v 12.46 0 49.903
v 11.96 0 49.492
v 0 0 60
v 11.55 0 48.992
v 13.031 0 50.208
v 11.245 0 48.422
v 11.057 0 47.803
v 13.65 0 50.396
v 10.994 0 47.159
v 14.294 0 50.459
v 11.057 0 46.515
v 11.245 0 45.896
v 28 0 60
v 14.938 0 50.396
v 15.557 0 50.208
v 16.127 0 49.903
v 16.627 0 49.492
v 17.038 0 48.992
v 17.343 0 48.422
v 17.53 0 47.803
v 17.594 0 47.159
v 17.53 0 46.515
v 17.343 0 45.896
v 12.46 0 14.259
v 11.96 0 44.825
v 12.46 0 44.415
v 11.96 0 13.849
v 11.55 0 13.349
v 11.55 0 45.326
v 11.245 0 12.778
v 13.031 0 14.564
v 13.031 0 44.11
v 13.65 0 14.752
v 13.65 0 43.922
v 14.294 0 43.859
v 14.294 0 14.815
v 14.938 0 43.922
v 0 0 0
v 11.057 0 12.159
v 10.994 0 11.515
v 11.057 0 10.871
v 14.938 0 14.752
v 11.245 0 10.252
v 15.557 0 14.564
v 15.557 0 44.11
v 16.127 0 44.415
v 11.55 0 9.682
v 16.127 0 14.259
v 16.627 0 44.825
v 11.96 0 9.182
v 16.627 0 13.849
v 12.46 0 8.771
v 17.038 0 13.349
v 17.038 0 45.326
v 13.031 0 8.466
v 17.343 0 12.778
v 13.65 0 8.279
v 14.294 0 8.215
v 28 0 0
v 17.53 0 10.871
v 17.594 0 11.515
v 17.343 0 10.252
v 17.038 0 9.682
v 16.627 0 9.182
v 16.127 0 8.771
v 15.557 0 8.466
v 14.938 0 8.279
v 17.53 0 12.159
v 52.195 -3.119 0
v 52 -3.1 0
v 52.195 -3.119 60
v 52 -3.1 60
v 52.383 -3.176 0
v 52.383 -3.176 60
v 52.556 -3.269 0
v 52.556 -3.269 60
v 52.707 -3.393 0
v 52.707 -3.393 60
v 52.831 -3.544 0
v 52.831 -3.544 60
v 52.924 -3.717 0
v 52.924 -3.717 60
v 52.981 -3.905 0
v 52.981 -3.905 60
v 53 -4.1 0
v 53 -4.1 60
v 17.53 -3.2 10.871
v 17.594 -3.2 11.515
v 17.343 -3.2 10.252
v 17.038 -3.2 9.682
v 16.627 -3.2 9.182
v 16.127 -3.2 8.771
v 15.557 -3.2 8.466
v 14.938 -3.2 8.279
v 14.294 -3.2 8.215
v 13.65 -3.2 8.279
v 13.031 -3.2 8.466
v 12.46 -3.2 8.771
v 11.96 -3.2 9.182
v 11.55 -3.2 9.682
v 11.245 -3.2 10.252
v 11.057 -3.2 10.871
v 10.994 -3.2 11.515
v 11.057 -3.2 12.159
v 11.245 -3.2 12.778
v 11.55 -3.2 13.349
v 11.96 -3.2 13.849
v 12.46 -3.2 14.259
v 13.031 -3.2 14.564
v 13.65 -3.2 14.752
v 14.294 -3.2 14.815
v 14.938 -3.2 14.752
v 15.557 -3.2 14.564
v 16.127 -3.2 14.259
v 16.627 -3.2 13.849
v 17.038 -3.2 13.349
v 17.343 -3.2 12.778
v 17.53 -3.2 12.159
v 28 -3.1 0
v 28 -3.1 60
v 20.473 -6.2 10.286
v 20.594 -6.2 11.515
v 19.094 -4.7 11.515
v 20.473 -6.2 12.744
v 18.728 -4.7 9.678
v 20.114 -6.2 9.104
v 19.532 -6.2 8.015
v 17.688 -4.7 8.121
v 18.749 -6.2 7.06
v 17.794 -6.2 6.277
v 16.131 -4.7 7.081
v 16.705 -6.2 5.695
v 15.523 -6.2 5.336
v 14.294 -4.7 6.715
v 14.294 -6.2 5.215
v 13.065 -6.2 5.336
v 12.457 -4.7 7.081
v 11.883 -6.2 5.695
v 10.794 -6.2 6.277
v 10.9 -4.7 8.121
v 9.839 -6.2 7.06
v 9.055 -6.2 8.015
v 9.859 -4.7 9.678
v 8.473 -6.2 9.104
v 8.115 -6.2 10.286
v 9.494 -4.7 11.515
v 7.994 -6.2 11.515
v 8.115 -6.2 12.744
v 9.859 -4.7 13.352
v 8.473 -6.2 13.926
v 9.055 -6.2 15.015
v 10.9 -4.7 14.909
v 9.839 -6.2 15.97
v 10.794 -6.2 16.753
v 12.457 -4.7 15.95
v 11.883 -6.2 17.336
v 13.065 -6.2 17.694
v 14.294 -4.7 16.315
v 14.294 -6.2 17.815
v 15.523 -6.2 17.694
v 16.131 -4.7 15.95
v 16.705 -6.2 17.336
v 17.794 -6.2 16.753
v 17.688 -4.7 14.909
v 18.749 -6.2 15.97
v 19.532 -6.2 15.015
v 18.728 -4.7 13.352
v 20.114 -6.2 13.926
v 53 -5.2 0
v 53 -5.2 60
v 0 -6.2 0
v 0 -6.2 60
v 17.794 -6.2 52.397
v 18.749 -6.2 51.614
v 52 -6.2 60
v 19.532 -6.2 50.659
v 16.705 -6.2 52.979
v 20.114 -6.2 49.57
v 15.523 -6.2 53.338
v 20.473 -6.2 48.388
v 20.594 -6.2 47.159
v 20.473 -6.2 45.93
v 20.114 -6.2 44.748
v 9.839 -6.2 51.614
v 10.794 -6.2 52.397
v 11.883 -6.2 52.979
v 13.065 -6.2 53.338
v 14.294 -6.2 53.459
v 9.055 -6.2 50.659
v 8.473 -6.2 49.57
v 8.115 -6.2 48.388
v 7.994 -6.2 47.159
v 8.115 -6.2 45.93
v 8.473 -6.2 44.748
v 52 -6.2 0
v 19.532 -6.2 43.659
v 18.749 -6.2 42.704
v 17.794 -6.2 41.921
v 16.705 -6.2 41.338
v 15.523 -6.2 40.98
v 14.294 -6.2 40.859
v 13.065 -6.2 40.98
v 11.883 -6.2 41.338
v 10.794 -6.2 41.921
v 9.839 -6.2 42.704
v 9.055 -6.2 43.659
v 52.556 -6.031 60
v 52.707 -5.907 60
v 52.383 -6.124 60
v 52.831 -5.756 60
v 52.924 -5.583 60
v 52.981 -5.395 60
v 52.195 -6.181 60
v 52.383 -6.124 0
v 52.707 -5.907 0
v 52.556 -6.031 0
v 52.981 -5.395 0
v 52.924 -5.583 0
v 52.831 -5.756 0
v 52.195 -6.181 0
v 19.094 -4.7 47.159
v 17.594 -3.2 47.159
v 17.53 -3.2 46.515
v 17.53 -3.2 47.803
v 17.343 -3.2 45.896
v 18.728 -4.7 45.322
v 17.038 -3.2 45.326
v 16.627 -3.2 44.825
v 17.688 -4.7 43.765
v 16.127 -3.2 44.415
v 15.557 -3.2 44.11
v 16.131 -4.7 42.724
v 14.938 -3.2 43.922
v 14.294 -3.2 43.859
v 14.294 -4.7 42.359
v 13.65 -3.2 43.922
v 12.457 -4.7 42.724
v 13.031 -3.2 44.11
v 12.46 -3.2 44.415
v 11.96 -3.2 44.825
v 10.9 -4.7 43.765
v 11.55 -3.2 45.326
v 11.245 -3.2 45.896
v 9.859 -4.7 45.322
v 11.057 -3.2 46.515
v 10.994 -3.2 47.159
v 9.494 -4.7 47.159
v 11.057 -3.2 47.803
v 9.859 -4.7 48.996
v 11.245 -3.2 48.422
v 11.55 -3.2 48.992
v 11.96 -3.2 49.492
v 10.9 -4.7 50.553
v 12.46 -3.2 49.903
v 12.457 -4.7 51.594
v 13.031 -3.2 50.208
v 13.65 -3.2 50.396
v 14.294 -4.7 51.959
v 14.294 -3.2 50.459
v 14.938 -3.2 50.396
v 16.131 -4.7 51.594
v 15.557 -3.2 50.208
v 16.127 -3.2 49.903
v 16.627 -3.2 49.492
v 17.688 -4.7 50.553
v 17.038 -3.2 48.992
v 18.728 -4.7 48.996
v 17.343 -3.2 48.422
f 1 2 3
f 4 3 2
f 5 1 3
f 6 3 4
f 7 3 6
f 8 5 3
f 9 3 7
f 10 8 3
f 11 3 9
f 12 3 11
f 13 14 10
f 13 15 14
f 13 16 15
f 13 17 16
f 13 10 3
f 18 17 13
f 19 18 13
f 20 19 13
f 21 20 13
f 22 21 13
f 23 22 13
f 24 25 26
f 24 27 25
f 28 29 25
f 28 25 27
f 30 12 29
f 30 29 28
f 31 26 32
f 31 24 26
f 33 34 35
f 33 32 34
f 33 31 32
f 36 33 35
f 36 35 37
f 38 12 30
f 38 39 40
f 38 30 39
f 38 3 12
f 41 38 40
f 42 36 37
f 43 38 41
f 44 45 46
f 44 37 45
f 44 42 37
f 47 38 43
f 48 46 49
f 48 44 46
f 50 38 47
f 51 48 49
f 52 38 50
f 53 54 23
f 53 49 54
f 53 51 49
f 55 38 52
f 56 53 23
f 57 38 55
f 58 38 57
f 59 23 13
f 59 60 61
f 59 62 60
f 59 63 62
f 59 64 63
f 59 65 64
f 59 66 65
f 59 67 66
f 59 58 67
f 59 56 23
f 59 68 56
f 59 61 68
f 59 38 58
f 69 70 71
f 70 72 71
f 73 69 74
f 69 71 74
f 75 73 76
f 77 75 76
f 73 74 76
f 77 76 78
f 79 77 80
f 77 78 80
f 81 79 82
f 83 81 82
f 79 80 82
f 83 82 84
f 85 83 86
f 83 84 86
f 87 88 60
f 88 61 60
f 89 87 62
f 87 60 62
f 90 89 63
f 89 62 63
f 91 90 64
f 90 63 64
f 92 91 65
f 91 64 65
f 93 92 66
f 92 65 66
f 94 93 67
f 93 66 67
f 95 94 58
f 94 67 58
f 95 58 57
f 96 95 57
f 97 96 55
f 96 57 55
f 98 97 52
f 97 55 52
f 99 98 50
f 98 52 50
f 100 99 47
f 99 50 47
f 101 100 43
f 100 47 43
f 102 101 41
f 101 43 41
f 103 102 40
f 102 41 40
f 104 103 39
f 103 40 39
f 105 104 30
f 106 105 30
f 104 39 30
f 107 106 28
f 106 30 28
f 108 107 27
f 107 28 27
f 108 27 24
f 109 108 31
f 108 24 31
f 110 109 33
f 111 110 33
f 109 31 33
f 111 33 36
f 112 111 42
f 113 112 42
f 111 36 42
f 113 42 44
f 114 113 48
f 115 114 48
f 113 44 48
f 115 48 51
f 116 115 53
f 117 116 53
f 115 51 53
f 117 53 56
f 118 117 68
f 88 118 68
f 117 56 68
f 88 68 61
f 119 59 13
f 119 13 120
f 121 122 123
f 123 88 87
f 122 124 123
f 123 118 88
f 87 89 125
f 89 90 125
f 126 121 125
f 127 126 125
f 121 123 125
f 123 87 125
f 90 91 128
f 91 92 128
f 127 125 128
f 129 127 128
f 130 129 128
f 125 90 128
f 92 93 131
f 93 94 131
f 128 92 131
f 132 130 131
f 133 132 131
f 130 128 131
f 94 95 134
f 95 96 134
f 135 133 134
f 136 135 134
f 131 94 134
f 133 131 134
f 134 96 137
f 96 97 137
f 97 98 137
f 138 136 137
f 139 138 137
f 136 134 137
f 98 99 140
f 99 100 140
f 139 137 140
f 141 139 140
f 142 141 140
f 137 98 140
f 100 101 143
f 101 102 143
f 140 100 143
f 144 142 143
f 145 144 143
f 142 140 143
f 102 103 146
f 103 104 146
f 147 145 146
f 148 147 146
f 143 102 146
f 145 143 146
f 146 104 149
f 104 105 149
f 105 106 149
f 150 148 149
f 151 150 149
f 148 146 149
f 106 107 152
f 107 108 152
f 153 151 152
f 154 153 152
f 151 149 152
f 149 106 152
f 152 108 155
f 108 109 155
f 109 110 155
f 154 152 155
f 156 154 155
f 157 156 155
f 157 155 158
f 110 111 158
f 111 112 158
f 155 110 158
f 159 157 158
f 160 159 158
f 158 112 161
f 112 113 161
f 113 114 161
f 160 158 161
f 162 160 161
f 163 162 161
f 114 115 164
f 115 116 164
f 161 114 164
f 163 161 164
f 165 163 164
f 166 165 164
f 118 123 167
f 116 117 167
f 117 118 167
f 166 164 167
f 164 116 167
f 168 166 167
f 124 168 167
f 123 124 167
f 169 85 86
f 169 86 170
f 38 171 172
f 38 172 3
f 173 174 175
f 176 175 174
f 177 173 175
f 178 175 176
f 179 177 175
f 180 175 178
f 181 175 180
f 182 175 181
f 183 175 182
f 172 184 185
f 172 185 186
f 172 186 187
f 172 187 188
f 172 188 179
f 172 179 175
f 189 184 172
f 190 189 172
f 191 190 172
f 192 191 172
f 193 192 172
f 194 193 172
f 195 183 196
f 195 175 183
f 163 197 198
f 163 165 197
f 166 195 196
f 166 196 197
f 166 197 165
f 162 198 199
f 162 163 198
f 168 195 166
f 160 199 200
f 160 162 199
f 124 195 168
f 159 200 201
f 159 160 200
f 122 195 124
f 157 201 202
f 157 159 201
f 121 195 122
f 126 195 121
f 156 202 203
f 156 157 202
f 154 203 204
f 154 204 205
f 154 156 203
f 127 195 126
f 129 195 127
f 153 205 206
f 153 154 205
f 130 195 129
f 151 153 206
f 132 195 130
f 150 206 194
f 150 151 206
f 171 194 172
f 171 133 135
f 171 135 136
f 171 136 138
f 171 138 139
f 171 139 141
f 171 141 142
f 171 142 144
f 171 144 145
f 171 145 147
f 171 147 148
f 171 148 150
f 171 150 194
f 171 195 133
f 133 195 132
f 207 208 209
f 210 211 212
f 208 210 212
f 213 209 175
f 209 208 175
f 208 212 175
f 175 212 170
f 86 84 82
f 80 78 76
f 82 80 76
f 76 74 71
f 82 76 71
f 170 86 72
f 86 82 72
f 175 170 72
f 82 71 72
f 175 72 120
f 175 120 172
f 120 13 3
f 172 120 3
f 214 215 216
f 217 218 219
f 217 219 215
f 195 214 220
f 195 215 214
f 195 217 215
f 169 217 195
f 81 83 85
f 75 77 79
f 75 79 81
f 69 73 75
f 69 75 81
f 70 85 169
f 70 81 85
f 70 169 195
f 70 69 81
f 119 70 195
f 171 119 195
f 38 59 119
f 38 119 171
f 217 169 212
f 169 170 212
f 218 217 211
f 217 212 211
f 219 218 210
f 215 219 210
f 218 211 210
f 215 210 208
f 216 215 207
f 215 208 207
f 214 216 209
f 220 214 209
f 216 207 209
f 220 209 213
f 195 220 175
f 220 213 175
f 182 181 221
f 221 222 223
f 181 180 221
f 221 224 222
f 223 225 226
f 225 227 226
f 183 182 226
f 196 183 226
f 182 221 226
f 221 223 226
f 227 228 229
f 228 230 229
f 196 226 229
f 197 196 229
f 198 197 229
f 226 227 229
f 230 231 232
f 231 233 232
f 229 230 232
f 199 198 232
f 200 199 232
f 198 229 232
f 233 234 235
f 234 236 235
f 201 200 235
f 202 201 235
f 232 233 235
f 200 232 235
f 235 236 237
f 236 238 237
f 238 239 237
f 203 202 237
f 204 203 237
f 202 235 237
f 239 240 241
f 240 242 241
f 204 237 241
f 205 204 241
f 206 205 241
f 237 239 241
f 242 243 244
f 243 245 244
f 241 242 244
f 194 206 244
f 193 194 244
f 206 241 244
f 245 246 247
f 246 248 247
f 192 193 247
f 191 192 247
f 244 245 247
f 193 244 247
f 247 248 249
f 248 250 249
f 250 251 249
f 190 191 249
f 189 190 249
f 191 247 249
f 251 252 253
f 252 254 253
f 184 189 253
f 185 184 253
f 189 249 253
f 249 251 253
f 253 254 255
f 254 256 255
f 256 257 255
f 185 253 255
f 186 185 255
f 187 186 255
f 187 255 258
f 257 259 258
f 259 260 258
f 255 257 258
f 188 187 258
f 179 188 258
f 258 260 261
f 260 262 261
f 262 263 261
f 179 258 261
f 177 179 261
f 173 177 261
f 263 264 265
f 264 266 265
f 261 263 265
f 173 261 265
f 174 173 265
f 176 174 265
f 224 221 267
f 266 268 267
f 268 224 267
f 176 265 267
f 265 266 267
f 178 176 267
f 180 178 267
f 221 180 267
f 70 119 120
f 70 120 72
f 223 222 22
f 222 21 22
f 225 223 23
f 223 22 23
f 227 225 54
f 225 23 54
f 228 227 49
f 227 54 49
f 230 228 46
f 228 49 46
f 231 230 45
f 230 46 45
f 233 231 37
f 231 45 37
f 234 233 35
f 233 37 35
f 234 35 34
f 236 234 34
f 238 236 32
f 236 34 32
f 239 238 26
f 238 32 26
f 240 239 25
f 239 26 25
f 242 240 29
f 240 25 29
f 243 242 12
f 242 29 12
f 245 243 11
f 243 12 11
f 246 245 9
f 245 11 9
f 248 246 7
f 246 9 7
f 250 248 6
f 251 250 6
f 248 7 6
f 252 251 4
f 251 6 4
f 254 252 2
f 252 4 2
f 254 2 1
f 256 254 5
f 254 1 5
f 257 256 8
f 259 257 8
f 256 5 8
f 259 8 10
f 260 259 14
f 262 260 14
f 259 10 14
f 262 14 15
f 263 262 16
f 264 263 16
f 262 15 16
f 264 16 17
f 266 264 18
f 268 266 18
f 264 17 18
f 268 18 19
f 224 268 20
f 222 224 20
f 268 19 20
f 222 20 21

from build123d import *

# Parameters (mm, degrees)
BOSS_EXTRU_1_DEPTH                             = 60
CONG_1_R                                       = 1
FRAISAGE_POUR_VIS_T_TE_FRAIS_E_M62_D           = 6.6
FRAISAGE_POUR_VIS_T_TE_FRAIS_E_M62_DEPTH       = 8
FRAISAGE_POUR_VIS_T_TE_FRAIS_E_M62_CSINK_D     = 12.6
FRAISAGE_POUR_VIS_T_TE_FRAIS_E_M62_CSINK_ANGLE = 90
FRAISAGE_POUR_VIS_T_TE_FRAIS_E_M62_TIP         = 1.982840043


with BuildPart() as part:
    # Esquisse1 → Boss.-Extru.1 (new body)
    with BuildSketch(Plane.XY):
        Polygon((0, 0), (28, 0), (28, -3.1), (53, -3.1), (53, -6.2), (0, -6.2), align=None)
    extrude(amount=BOSS_EXTRU_1_DEPTH)

    # Congé1
    cong_1_edges = [part.edges().sort_by_distance(p)[0] for p in [
        (53, -3.1, 30),
        (53, -6.2, 30),
    ]]
    fillet(cong_1_edges, radius=CONG_1_R)

    # Fraisage pour vis à tête fraisée M62
    with Locations(Plane(origin=(0, -6.2, 0), x_dir=(-1, 0, 0), z_dir=(0, -1, 0))):
        with Locations((-14.293755616, -11.515144287), (-14.293755616, -47.158937793)):
            CounterSinkHole(FRAISAGE_POUR_VIS_T_TE_FRAIS_E_M62_D / 2, FRAISAGE_POUR_VIS_T_TE_FRAIS_E_M62_CSINK_D / 2, depth=FRAISAGE_POUR_VIS_T_TE_FRAIS_E_M62_DEPTH, counter_sink_angle=FRAISAGE_POUR_VIS_T_TE_FRAIS_E_M62_CSINK_ANGLE)
            with Locations((0, 0, -(FRAISAGE_POUR_VIS_T_TE_FRAIS_E_M62_DEPTH + FRAISAGE_POUR_VIS_T_TE_FRAIS_E_M62_TIP / 2))):  # 118° drill point
                Cone(0, FRAISAGE_POUR_VIS_T_TE_FRAIS_E_M62_D / 2, FRAISAGE_POUR_VIS_T_TE_FRAIS_E_M62_TIP, mode=Mode.SUBTRACT)


solid = part.part
